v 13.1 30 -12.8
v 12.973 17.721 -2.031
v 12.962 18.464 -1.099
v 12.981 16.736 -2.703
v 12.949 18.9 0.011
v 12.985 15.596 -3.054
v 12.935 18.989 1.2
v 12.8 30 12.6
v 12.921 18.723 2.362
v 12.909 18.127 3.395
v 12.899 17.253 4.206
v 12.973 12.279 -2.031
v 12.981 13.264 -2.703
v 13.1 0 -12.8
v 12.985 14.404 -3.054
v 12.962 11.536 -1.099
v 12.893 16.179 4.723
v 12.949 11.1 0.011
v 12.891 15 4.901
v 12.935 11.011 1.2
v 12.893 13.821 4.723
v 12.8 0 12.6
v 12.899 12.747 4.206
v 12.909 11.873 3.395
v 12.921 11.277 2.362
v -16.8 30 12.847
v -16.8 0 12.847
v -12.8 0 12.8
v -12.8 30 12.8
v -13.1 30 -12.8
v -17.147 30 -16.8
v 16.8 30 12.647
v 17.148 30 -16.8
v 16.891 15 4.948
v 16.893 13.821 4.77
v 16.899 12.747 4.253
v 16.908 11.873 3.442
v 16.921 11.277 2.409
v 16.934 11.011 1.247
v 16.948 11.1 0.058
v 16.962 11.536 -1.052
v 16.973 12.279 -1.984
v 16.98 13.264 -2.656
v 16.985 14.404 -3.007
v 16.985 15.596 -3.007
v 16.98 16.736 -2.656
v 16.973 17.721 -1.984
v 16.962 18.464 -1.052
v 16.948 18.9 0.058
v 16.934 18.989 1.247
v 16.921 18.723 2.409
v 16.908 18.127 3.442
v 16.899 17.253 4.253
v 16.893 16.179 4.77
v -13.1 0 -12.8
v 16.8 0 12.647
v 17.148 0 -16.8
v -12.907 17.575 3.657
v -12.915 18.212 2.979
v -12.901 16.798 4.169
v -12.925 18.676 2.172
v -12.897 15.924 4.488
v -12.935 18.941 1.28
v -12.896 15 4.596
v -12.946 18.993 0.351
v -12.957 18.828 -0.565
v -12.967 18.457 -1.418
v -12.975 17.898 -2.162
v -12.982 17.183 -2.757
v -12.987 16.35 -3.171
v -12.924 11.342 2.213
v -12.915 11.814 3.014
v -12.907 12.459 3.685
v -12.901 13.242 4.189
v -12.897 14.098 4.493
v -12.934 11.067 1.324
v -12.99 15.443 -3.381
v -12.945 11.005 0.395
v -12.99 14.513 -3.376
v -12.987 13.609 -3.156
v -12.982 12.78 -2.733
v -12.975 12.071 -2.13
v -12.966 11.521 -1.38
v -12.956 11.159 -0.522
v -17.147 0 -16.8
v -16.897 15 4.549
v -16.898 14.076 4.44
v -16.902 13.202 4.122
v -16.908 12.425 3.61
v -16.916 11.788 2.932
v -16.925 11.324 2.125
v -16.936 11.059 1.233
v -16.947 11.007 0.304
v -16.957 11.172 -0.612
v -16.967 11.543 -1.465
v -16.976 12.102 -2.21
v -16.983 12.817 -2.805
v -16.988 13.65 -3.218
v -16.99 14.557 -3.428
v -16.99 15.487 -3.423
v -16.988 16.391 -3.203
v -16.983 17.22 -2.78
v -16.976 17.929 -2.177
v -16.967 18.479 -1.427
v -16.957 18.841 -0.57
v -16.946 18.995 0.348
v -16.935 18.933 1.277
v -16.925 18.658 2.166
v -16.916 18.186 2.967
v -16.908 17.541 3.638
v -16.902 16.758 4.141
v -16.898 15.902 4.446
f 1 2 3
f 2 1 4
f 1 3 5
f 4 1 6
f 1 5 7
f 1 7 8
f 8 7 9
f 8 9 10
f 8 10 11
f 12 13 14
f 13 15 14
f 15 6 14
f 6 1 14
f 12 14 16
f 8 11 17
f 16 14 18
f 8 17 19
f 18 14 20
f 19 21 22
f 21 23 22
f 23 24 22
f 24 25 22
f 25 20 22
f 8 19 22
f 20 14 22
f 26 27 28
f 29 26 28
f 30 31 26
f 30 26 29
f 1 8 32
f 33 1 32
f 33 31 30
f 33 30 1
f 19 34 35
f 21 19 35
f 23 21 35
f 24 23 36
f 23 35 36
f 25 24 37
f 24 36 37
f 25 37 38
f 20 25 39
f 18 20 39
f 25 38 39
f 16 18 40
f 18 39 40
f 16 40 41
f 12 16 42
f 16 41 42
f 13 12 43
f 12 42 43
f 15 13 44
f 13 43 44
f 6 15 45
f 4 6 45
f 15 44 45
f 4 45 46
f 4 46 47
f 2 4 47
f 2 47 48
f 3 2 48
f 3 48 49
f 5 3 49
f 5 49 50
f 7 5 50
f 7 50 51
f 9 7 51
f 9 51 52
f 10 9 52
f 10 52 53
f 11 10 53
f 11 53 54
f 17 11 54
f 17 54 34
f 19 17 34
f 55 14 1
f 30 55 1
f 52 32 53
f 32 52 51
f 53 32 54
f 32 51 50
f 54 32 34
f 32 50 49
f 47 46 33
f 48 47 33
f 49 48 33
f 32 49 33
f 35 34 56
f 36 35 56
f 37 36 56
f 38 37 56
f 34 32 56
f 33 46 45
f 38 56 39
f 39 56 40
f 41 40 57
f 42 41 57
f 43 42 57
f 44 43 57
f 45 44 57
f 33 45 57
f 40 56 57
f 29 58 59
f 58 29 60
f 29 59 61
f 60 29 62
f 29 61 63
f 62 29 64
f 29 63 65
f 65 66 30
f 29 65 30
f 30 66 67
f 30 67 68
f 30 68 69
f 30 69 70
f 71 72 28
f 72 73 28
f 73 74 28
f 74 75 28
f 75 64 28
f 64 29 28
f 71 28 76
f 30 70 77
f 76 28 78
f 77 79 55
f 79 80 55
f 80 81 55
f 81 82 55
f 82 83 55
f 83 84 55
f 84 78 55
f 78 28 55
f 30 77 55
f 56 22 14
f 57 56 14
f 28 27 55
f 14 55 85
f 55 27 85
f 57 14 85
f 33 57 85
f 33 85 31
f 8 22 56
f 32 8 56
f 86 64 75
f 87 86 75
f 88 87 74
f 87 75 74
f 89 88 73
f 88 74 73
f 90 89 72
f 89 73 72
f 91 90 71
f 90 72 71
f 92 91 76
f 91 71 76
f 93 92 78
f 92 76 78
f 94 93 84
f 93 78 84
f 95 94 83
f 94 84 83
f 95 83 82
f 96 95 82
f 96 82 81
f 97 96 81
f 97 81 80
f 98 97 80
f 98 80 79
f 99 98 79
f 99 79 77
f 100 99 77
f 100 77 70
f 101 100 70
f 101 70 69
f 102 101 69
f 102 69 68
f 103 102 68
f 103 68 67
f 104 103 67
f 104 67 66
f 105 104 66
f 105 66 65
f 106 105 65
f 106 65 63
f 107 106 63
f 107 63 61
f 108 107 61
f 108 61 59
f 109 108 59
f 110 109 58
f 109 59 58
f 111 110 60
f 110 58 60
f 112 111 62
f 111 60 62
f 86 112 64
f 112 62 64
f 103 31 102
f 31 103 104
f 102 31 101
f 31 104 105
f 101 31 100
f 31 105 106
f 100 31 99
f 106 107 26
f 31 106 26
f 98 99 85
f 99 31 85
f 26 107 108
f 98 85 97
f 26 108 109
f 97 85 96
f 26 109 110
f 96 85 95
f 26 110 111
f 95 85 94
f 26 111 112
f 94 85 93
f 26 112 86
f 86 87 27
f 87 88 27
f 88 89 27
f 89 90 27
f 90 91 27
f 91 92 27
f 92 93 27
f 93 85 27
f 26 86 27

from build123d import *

# Parameters (mm, degrees)
BOSS_EXTRUDE1_DEPTH      = 30
SKETCH3_R                = 4
CUT_EXTRUDE1_DEPTH       = 40
SKETCH4_W                = 3
SKETCH4_H                = 41
BOSS_EXTRUDE2_DEPTH      = 4
BOSS_EXTRUDE3_DEPTH      = 25
BOSS_EXTRUDE3_DEPTH_BACK = 4
SKETCH5_W                = 3
SKETCH5_H                = 7.75
BOSS_EXTRUDE4_REACH      = 69.734
SKETCH6_W                = 4
SKETCH6_H                = 56.5
CUT_EXTRUDE2_DEPTH       = 62


with BuildPart() as part:
    # Sketch1 → Boss-Extrude1 (new body)
    with BuildSketch(Plane(origin=(0, 0, 0), x_dir=(1, 0, 0), z_dir=(0, 1, 0))):
        Polygon((-12.8, -12.8), (-13.1, 12.8), (13.1, 12.8), (12.8, -12.6), (16.799721029, -12.6472408), (17.147523085, 16.8), (-17.147149649, 16.8), (-16.79972537, -12.846871782), align=None)
    extrude(amount=BOSS_EXTRUDE1_DEPTH)

    # Sketch3 → Cut-Extrude1 (cut)
    with BuildSketch(Plane(origin=(16.946733814, 0, 0.200158273), x_dir=(0.011810199887684227, 0, -0.9999302571572745), z_dir=(0.9999302571572745, 0, 0.011810199887684227))):
        with Locations(Location((-0.747950682, 15, 0), (0, 0, 180))):
            Circle(SKETCH3_R)
    extrude(amount=-CUT_EXTRUDE1_DEPTH, mode=Mode.SUBTRACT)

    # Sketch4 → Boss-Extrude2 (add)
    with BuildSketch(Plane(origin=(0, 0, -16.8), x_dir=(-1, 0, 0), z_dir=(0, 0, -1))):
        with Locations((12.499813282, 15)):
            Rectangle(SKETCH4_W, SKETCH4_H)
    extrude(amount=-BOSS_EXTRUDE2_DEPTH)

    # Sketch5 → Boss-Extrude3 (add, two sides: drawn at the far end of the back side and taken through both)
    with BuildSketch(Plane(origin=(0, 0, -16.8), x_dir=(-1, 0, 0), z_dir=(0, 0, -1)).offset(-BOSS_EXTRUDE3_DEPTH_BACK)):
        with Locations((12.499813282, 39.375)):
            Rectangle(SKETCH5_W, SKETCH5_H)
        with Locations((12.499813282, -9.375)):
            Rectangle(SKETCH5_W, SKETCH5_H)
    extrude(amount=BOSS_EXTRUDE3_DEPTH + BOSS_EXTRUDE3_DEPTH_BACK)

    # Boss-Extrude4: up to this plane
    boss_extrude4_end = Plane(origin=(-16.79972537, 30, 12.846871782), z_dir=(0.9999313425206403, 0, -0.01171794542016394))
    # Sketch6 → Boss-Extrude4 (add, up to the surface)
    with BuildSketch(Plane.ZY.offset(13.999813282), mode=Mode.PRIVATE) as boss_extrude4_sk1:
        with Locations((-14.8, 15)):
            Rectangle(SKETCH6_W, SKETCH6_H)
    boss_extrude4_tool1 = split(extrude(boss_extrude4_sk1.sketch, amount=BOSS_EXTRUDE4_REACH, mode=Mode.PRIVATE), bisect_by=boss_extrude4_end, keep=Keep.BOTH, mode=Mode.PRIVATE)
    add(boss_extrude4_tool1.solids().sort_by_distance((-13.999813, 15, -14.8))[0])

    # Sketch7 → Cut-Extrude2 (cut)
    with BuildSketch(Plane(origin=(-16.947947202, 0, 0.198608756), x_dir=(0.01171794542016394, 0, 0.9999313425206403), z_dir=(-0.9999313425206403, 0, 0.01171794542016394))):
        Polygon((12.649131483, 30), (-40.255802642, 30), (-53.566220107, 38.891145172), (-52.192714639, 50.02792354), (-13.80333558, 48.779139174), (23.506142402, 46.053591691), (14.671560105, 30), align=None)
        Polygon((12.649131483, 0), (-49.960950266, 0), (-43.210741963, -24.331655391), (11.653429031, -25.806337238), (35.291011187, -15.934393486), (29.689158759, -2.52120452), align=None)
    extrude(amount=-CUT_EXTRUDE2_DEPTH, mode=Mode.SUBTRACT)


solid = part.part
